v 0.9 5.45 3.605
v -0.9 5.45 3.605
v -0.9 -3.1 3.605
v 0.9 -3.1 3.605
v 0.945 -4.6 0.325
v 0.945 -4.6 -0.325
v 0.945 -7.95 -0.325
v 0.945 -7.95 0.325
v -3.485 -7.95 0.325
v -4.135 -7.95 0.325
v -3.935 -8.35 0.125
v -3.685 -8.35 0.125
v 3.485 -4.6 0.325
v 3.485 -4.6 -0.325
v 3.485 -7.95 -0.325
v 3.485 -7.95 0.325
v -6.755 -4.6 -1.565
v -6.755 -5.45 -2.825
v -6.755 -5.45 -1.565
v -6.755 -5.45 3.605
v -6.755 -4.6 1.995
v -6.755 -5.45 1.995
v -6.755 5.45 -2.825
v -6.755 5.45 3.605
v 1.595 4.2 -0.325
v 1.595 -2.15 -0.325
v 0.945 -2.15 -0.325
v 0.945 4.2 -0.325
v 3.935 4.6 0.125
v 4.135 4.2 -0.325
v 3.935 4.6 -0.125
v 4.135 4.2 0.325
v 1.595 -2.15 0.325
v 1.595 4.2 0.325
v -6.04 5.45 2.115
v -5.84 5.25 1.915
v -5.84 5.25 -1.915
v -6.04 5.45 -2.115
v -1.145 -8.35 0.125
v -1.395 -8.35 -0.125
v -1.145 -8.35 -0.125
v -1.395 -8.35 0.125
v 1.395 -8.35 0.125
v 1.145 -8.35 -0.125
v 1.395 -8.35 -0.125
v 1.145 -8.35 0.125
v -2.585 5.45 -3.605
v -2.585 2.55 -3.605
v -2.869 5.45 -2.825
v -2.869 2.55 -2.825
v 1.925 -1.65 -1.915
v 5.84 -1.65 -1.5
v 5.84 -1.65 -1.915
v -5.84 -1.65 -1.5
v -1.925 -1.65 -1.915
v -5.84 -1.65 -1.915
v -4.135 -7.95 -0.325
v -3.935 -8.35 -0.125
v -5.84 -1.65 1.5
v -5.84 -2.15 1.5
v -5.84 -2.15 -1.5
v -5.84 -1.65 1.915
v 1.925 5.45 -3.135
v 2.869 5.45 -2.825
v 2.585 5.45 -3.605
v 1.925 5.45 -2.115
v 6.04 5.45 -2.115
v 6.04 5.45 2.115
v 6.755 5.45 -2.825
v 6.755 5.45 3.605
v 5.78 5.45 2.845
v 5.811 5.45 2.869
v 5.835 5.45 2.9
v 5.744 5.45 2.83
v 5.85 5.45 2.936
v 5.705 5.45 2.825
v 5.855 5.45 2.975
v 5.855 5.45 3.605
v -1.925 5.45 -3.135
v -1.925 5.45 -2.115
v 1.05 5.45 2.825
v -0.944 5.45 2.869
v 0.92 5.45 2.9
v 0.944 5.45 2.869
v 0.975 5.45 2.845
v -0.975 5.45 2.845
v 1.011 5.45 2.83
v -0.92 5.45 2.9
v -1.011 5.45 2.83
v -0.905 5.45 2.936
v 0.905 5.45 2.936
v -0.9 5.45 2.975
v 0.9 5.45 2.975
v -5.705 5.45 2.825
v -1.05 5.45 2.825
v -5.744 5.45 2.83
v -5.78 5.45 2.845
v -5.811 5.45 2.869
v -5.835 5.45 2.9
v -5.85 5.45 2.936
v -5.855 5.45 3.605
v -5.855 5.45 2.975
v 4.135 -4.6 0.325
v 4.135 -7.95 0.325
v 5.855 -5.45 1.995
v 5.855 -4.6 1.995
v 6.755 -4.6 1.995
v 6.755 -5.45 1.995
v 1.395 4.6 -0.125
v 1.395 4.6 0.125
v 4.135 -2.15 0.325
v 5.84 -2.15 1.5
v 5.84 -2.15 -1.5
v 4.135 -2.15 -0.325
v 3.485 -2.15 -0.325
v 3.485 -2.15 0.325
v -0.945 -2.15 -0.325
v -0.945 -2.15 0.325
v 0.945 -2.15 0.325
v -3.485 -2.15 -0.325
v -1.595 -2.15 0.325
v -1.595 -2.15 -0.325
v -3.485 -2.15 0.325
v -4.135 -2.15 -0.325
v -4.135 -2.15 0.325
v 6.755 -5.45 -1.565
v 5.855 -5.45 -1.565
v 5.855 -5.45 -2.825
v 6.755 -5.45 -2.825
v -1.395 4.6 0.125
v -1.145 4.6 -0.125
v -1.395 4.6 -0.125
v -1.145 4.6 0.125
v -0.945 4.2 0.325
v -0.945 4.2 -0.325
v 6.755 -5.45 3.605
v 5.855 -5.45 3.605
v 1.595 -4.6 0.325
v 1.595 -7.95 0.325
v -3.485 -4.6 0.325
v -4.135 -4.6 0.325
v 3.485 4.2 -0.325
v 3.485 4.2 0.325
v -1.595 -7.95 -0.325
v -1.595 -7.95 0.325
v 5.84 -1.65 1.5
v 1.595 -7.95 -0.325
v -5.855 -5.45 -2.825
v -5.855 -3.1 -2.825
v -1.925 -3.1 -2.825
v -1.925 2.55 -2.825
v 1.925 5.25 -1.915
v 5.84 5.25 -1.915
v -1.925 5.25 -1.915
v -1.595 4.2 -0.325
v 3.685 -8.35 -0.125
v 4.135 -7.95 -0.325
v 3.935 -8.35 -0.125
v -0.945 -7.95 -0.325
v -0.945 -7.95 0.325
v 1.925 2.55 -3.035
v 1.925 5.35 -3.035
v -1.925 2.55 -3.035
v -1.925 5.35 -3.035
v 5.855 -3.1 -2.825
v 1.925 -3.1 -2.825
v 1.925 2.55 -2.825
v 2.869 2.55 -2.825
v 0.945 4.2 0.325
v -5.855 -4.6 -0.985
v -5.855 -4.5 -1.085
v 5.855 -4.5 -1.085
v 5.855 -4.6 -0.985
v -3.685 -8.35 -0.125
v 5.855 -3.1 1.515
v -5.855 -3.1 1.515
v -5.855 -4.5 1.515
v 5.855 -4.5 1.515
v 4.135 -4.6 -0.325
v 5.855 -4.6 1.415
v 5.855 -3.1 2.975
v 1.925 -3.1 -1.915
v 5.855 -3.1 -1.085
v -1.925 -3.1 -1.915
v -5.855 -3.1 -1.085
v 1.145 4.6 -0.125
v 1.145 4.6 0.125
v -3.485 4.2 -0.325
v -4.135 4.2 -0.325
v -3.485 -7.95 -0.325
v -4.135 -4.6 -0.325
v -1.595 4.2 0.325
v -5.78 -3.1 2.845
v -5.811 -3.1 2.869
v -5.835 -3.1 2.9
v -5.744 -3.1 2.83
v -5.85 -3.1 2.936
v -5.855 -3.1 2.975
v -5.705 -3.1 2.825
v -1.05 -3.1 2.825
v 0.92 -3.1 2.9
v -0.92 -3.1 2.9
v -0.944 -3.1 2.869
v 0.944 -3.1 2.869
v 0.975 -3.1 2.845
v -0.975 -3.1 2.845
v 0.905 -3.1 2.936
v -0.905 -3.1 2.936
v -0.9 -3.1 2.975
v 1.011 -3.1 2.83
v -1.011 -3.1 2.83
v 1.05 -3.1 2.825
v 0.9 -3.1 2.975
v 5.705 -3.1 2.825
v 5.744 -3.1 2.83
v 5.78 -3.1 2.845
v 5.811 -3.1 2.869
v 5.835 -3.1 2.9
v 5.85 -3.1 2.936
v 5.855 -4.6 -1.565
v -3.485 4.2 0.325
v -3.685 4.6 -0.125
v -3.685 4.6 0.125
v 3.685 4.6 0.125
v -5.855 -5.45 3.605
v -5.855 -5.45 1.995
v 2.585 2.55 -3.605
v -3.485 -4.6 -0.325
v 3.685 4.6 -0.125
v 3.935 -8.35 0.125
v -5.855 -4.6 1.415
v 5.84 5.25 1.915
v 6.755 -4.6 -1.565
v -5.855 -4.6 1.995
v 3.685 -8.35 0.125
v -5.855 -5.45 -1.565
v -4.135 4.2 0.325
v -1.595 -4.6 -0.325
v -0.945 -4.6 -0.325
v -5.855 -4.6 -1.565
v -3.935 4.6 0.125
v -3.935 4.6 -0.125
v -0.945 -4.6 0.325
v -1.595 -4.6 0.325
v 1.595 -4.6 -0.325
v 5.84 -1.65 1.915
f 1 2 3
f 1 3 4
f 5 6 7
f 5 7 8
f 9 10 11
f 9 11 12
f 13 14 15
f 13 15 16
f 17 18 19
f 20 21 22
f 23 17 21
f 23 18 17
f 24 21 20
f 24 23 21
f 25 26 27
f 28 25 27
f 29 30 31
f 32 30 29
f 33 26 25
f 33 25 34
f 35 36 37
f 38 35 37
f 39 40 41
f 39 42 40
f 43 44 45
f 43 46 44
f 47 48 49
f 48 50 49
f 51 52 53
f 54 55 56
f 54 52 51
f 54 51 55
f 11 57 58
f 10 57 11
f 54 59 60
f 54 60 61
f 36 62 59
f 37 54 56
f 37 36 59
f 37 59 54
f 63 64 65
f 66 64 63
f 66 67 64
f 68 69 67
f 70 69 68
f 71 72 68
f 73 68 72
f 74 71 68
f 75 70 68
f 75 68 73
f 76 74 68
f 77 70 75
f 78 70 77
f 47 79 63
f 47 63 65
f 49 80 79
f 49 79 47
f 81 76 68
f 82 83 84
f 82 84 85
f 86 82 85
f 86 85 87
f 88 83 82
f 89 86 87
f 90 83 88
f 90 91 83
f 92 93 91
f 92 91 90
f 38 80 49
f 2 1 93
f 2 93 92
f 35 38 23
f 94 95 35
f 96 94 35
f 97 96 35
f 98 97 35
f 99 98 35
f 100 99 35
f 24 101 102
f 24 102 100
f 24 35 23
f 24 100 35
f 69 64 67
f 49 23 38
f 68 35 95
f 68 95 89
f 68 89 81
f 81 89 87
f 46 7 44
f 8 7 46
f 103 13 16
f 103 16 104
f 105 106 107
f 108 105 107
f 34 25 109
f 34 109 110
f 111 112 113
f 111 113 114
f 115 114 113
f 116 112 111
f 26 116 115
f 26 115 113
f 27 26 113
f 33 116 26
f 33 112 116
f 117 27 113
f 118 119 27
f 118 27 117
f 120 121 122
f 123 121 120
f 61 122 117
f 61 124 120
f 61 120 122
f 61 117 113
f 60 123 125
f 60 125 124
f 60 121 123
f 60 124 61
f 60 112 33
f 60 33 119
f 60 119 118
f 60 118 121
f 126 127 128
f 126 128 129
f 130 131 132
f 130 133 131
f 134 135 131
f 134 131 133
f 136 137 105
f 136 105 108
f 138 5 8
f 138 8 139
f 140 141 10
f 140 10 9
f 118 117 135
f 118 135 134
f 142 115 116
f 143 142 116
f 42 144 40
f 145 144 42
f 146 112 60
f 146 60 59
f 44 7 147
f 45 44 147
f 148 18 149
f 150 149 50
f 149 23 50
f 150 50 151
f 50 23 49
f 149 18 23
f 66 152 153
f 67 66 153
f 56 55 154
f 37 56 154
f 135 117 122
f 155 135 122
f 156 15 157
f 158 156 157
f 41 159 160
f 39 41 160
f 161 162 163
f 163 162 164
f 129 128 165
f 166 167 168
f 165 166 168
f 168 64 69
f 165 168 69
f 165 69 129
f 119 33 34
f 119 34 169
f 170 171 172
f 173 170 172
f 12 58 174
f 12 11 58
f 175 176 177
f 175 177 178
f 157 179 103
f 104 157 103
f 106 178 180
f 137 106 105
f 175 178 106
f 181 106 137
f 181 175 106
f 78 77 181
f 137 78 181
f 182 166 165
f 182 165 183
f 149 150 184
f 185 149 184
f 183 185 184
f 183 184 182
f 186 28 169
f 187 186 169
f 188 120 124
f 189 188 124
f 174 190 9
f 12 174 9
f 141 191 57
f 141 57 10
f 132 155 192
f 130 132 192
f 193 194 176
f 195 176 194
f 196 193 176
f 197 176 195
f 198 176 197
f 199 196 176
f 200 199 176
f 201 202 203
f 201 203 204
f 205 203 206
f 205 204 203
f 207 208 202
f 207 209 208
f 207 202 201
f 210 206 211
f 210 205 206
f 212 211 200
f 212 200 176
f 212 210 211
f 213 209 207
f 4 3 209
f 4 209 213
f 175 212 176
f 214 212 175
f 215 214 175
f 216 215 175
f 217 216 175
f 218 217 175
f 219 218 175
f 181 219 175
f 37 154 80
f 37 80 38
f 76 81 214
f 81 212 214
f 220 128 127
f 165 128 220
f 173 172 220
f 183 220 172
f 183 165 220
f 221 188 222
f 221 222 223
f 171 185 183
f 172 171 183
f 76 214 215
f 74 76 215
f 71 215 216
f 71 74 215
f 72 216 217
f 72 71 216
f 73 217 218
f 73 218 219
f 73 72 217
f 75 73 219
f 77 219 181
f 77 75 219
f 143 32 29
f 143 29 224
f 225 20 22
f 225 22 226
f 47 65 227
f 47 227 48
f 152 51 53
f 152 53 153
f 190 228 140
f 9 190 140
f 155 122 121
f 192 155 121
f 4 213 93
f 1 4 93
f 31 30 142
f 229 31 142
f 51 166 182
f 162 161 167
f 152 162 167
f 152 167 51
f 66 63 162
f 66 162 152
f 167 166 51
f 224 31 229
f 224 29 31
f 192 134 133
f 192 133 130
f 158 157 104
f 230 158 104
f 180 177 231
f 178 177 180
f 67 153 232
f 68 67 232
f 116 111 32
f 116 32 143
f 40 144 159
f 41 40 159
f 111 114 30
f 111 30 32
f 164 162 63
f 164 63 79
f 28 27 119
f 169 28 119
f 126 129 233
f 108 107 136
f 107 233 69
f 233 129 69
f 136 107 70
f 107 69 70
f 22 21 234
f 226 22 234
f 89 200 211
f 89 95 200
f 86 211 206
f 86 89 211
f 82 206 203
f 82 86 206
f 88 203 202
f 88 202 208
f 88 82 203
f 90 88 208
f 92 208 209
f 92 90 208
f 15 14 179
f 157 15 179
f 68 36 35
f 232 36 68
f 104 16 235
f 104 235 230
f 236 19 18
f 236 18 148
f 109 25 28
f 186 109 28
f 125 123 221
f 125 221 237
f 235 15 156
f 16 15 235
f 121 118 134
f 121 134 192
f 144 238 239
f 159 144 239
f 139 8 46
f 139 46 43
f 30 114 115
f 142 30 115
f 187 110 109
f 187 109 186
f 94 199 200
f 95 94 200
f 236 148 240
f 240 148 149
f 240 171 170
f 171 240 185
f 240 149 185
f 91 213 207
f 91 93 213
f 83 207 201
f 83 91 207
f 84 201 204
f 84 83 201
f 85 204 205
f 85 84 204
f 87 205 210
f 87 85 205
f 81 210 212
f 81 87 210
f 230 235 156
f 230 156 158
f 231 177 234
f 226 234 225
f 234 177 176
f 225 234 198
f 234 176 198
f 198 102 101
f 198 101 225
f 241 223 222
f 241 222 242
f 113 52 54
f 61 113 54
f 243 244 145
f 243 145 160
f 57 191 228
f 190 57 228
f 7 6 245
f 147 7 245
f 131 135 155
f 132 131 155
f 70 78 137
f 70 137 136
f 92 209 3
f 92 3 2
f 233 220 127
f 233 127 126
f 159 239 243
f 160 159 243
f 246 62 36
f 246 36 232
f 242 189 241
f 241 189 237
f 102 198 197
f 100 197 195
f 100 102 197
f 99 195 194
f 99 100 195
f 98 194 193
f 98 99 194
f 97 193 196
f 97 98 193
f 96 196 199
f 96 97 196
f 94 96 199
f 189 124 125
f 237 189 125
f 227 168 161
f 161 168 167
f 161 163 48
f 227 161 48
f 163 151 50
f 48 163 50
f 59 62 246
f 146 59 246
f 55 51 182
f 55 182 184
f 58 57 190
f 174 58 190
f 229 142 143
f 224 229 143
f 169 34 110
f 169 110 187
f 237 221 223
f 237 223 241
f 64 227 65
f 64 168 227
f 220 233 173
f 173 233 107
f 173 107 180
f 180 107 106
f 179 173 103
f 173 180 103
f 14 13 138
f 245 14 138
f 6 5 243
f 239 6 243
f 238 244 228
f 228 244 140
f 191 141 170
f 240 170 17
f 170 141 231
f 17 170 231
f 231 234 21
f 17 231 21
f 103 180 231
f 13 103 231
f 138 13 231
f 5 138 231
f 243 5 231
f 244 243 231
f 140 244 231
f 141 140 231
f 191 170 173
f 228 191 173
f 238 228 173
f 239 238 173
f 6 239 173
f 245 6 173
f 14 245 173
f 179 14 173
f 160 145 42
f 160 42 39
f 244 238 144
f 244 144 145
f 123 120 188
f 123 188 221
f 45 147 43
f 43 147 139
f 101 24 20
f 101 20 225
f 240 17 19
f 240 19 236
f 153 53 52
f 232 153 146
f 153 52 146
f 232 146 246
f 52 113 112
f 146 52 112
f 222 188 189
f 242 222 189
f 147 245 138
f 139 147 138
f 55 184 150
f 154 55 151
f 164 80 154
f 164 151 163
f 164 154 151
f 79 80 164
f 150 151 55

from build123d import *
from OCP.BRepFilletAPI import BRepFilletAPI_MakeChamfer

# Parameters (mm, degrees)
CUT_EXTRUDE1_START       = -8.68
CUT_EXTRUDE1_OUTLINE_W   = 6.64
CUT_EXTRUDE1_OUTLINE_H   = 7.1
CUT_EXTRUDE1_DEPTH       = 4.83
CUT_EXTRUDE1_2_OUTLINE_W = 6.64
CUT_EXTRUDE1_2_OUTLINE_H = 7.1
CUT_EXTRUDE1_2_DEPTH     = 4.83
CUT_EXTRUDE1_START_2     = -3.85
CUT_EXTRUDE1_3_OUTLINE_W = 2.105
CUT_EXTRUDE1_3_OUTLINE_H = 7.1
CUT_EXTRUDE1_3_DEPTH     = 3.85
BOSS_EXTRUDE1_DEPTH      = 2.95
SKETCH3_W                = 3.415
SKETCH3_H                = 7.1
CUT_EXTRUDE2_DEPTH       = 3.915
SKETCH4_W                = 3.415
SKETCH4_H                = 7.1
CUT_EXTRUDE3_DEPTH       = 3.915
SKETCH5_W                = 0.21
SKETCH5_H                = 10.05
CUT_EXTRUDE4_DEPTH       = 4.1696
SKETCH6_W                = 4.83
SKETCH6_H                = 0.21
SKETCH6_W_2              = 0.6604
CUT_EXTRUDE5_DEPTH       = 7.15
SKETCH7_W                = 0.21
SKETCH7_H                = 2.9
CUT_EXTRUDE6_DEPTH       = 4.1696
SKETCH8_W                = 5.1708
SKETCH8_H                = 2.9
BOSS_EXTRUDE2_DEPTH      = 0.57
SKETCH9_W                = 11.71
SKETCH9_H                = 0.78
CUT_EXTRUDE7_DEPTH       = 13.634419259
SKETCH10_W               = 1.8
SKETCH10_H               = 8.55
BOSS_EXTRUDE3_DEPTH      = 0.78
SKETCH11_W               = 11.71
SKETCH11_H               = 1.5
CUT_EXTRUDE8_DEPTH       = 1.31
SKETCH12_W               = 0.9
SKETCH12_H               = 1.61
BOSS_EXTRUDE4_DEPTH      = 0.85
SKETCH13_W               = 0.9
SKETCH13_H               = 1.61
BOSS_EXTRUDE5_DEPTH      = 0.85
CUT_EXTRUDE9_REACH       = 11.866
SKETCH15_W               = 3.85
SKETCH15_H               = 1.5
SKETCH16_W               = 1.74
SKETCH16_H               = 1.5
CUT_EXTRUDE10_DEPTH      = 3.93
SKETCH17_W               = 0.9
SKETCH17_H               = 1.26
BOSS_EXTRUDE6_DEPTH      = 0.85
SKETCH18_W               = 1.74
SKETCH18_H               = 1.5
CUT_EXTRUDE11_DEPTH      = 3.93
SKETCH19_W               = 0.9
SKETCH19_H               = 1.26
BOSS_EXTRUDE7_DEPTH      = 0.85
SKETCH20_W               = 11.68
SKETCH20_H               = 3
CUT_EXTRUDE12_DEPTH      = 0.5
CUT_EXTRUDE13_REACH      = 12.442
SKETCH22_W               = 11.68
SKETCH22_H               = 0.415
SKETCH23_W               = 0.65
SKETCH23_H               = 0.65
BOSS_EXTRUDE8_DEPTH      = 6.75
SKETCH24_W               = 0.65
SKETCH24_H               = 0.65
BOSS_EXTRUDE9_DEPTH      = 6.75
SKETCH25_W               = 0.65
SKETCH25_H               = 0.65
BOSS_EXTRUDE10_DEPTH     = 6.75
SKETCH26_W               = 0.65
SKETCH26_H               = 0.65
BOSS_EXTRUDE11_DEPTH     = 6.75
SKETCH27_W               = 0.65
SKETCH27_H               = 0.65
BOSS_EXTRUDE12_DEPTH     = 3.75
SKETCH28_W               = 0.65
SKETCH28_H               = 0.65
BOSS_EXTRUDE13_DEPTH     = 3.75
SKETCH29_W               = 0.65
SKETCH29_H               = 0.65
BOSS_EXTRUDE14_DEPTH     = 3.75
SKETCH30_W               = 0.65
SKETCH30_H               = 0.65
BOSS_EXTRUDE15_DEPTH     = 3.75
DRAFT1_ANGLE             = 20
CHAMFER1_SIZE            = 0.1
CHAMFER2_SIZE            = 0.2
CHAMFER2_SIZE2           = 0.4
CHAMFER3_SIZE            = 0.2
FILLET1_R                = 0.15


with BuildPart() as part:
    # Cut-Extrude1: read off the stored shape, not the designer's step
    # Cut-Extrude1 outline → Cut-Extrude1 (new body)
    with BuildSketch(Plane(origin=(1.925, 0, 0), x_dir=(0, 0, -1), z_dir=(1, 0, 0)).offset(CUT_EXTRUDE1_START)):
        with Locations((-0.285, 1.9)):
            Rectangle(CUT_EXTRUDE1_OUTLINE_W, CUT_EXTRUDE1_OUTLINE_H)
    extrude(amount=CUT_EXTRUDE1_DEPTH)



with BuildPart() as body_2:
    # Cut-Extrude1 2 outline → Cut-Extrude1 2 (new body)
    with BuildSketch(Plane(origin=(1.925, 0, 0), x_dir=(0, 0, -1), z_dir=(1, 0, 0))):
        with Locations((-0.285, 1.9)):
            Rectangle(CUT_EXTRUDE1_2_OUTLINE_W, CUT_EXTRUDE1_2_OUTLINE_H)
    extrude(amount=CUT_EXTRUDE1_2_DEPTH)


with BuildPart() as part_1:
    add(part.part)

    add(body_2.part)  # Cut-Extrude1 3 merges body 2
    # Cut-Extrude1 3 outline → Cut-Extrude1 3 (add)
    with BuildSketch(Plane(origin=(1.925, 0, 0), x_dir=(0, 0, -1), z_dir=(1, 0, 0)).offset(CUT_EXTRUDE1_START_2)):
        with Locations((-2.5525, 1.9)):
            Rectangle(CUT_EXTRUDE1_3_OUTLINE_W, CUT_EXTRUDE1_3_OUTLINE_H)
    extrude(amount=CUT_EXTRUDE1_3_DEPTH)

    # Sketch2 → Boss-Extrude1 (add)
    with BuildSketch(Plane.XZ.offset(1.65)):
        Polygon((6.755, -3.035), (1.925, -3.035), (1.925, -1.915), (-1.925, -1.915), (-1.925, -3.035), (-6.755, -3.035), (-6.755, 3.605), (6.755, 3.605), align=None)
    extrude(amount=BOSS_EXTRUDE1_DEPTH)

    # Sketch3 → Cut-Extrude2 (cut)
    with BuildSketch(Plane.ZY.offset(-1.925)):
        with Locations((-0.2075, 1.9)):
            Rectangle(SKETCH3_W, SKETCH3_H)
    extrude(amount=-CUT_EXTRUDE2_DEPTH, mode=Mode.SUBTRACT)

    # Sketch4 → Cut-Extrude3 (cut)
    with BuildSketch(Plane(origin=(-1.925, 0, 0), x_dir=(0, 0, -1), z_dir=(1, 0, 0))):
        with Locations((0.2075, 1.9)):
            Rectangle(SKETCH4_W, SKETCH4_H)
    extrude(amount=-CUT_EXTRUDE3_DEPTH, mode=Mode.SUBTRACT)

    # Sketch5 → Cut-Extrude4 (cut)
    with BuildSketch(Plane(origin=(6.755, 0, 0), x_dir=(0, 0, -1), z_dir=(1, 0, 0))):
        with Locations((2.93, 0.425)):
            Rectangle(SKETCH5_W, SKETCH5_H)
    extrude(amount=-CUT_EXTRUDE4_DEPTH, mode=Mode.SUBTRACT)

    # Sketch6 → Cut-Extrude5 (cut)
    with BuildSketch(Plane.XZ.offset(4.6)):
        with Locations((-4.34, -2.93)):
            Rectangle(SKETCH6_W, SKETCH6_H)
        with Locations((2.2552, -2.93)):
            Rectangle(SKETCH6_W_2, SKETCH6_H)
    extrude(amount=-CUT_EXTRUDE5_DEPTH, mode=Mode.SUBTRACT)

    # Sketch7 → Cut-Extrude6 (cut)
    with BuildSketch(Plane.ZY.offset(6.755)):
        with Locations((-2.93, 4)):
            Rectangle(SKETCH7_W, SKETCH7_H)
    extrude(amount=-CUT_EXTRUDE6_DEPTH, mode=Mode.SUBTRACT)

    # Sketch8 → Boss-Extrude2 (add)
    with BuildSketch(Plane(origin=(0, 0, -3.035), x_dir=(-1, 0, 0), z_dir=(0, 0, -1))):
        with Locations((0, 4)):
            Rectangle(SKETCH8_W, SKETCH8_H)
    extrude(amount=BOSS_EXTRUDE2_DEPTH)

    # Sketch9 → Cut-Extrude7 (cut, through all)
    with BuildSketch(Plane.XZ.offset(4.6)):
        with Locations((0, 3.215)):
            Rectangle(SKETCH9_W, SKETCH9_H)
    extrude(amount=-CUT_EXTRUDE7_DEPTH, mode=Mode.SUBTRACT)

    # Sketch10 → Boss-Extrude3 (add)
    with BuildSketch(Plane.XY.offset(2.825)):
        with Locations((0, 1.175)):
            Rectangle(SKETCH10_W, SKETCH10_H)
    extrude(amount=BOSS_EXTRUDE3_DEPTH)

    # Sketch11 → Cut-Extrude8 (cut)
    with BuildSketch(Plane.XY.offset(2.825)):
        with Locations((0, -3.85)):
            Rectangle(SKETCH11_W, SKETCH11_H)
    extrude(amount=-CUT_EXTRUDE8_DEPTH, mode=Mode.SUBTRACT)

    # Sketch12 → Boss-Extrude4 (add)
    with BuildSketch(Plane.XZ.offset(4.6)):
        with Locations((6.305, 2.8)):
            Rectangle(SKETCH12_W, SKETCH12_H)
    extrude(amount=BOSS_EXTRUDE4_DEPTH)

    # Sketch13 → Boss-Extrude5 (add)
    with BuildSketch(Plane.XZ.offset(4.6)):
        with Locations((-6.305, 2.8)):
            Rectangle(SKETCH13_W, SKETCH13_H)
    extrude(amount=BOSS_EXTRUDE5_DEPTH)

    # Sketch15 → Cut-Extrude9 (cut, up to next)
    with BuildSketch(Plane.XY.offset(-1.085), mode=Mode.PRIVATE) as cut_extrude9_sk1:
        with Locations((0, -3.85)):
            Rectangle(SKETCH15_W, SKETCH15_H)
    cut_extrude9_tool1 = extrude(cut_extrude9_sk1.sketch, amount=-CUT_EXTRUDE9_REACH, mode=Mode.PRIVATE) & part_1.part
    add(cut_extrude9_tool1.solids().sort_by_distance((0, -3.85, -1.085))[0], mode=Mode.SUBTRACT)

    # Sketch16 → Cut-Extrude10 (cut)
    with BuildSketch(Plane.ZY.offset(-1.925)):
        with Locations((-1.955, -3.85)):
            Rectangle(SKETCH16_W, SKETCH16_H)
    extrude(amount=-CUT_EXTRUDE10_DEPTH, mode=Mode.SUBTRACT)

    # Sketch17 → Boss-Extrude6 (add)
    with BuildSketch(Plane.XZ.offset(4.6)):
        with Locations((6.305, -2.195)):
            Rectangle(SKETCH17_W, SKETCH17_H)
    extrude(amount=BOSS_EXTRUDE6_DEPTH)

    # Sketch18 → Cut-Extrude11 (cut)
    with BuildSketch(Plane(origin=(-1.925, 0, 0), x_dir=(0, 0, -1), z_dir=(1, 0, 0))):
        with Locations((1.955, -3.85)):
            Rectangle(SKETCH18_W, SKETCH18_H)
    extrude(amount=-CUT_EXTRUDE11_DEPTH, mode=Mode.SUBTRACT)

    # Sketch19 → Boss-Extrude7 (add)
    with BuildSketch(Plane.XZ.offset(4.6)):
        with Locations((-6.305, -2.195)):
            Rectangle(SKETCH19_W, SKETCH19_H)
    extrude(amount=BOSS_EXTRUDE7_DEPTH)

    # Sketch20 → Cut-Extrude12 (cut)
    with BuildSketch(Plane(origin=(0, -1.65, 0), x_dir=(-1, 0, 0), z_dir=(0, 1, 0))):
        Rectangle(SKETCH20_W, SKETCH20_H)
    extrude(amount=-CUT_EXTRUDE12_DEPTH, mode=Mode.SUBTRACT)

    # Sketch22 → Cut-Extrude13 (cut, up to next)
    with BuildSketch(Plane.XZ.offset(1.65), mode=Mode.PRIVATE) as cut_extrude13_sk1:
        with Locations((0, 1.7075)):
            Rectangle(SKETCH22_W, SKETCH22_H)
    cut_extrude13_tool1 = extrude(cut_extrude13_sk1.sketch, amount=-CUT_EXTRUDE13_REACH, mode=Mode.PRIVATE) & part_1.part
    add(cut_extrude13_tool1.solids().sort_by_distance((0, -1.65, 1.7075))[0], mode=Mode.SUBTRACT)

    # Sketch23 → Boss-Extrude8 (add)
    with BuildSketch(Plane(origin=(0, -2.15, 0), x_dir=(-1, 0, 0), z_dir=(0, 1, 0))):
        with Locations((3.81, 0)):
            Rectangle(SKETCH23_W, SKETCH23_H)
    extrude(amount=BOSS_EXTRUDE8_DEPTH)

    # Sketch24 → Boss-Extrude9 (add)
    with BuildSketch(Plane(origin=(0, -2.15, 0), x_dir=(-1, 0, 0), z_dir=(0, 1, 0))):
        with Locations((1.27, 0)):
            Rectangle(SKETCH24_W, SKETCH24_H)
    extrude(amount=BOSS_EXTRUDE9_DEPTH)

    # Sketch25 → Boss-Extrude10 (add)
    with BuildSketch(Plane(origin=(0, -2.15, 0), x_dir=(-1, 0, 0), z_dir=(0, 1, 0))):
        with Locations((-1.27, 0)):
            Rectangle(SKETCH25_W, SKETCH25_H)
    extrude(amount=BOSS_EXTRUDE10_DEPTH)

    # Sketch26 → Boss-Extrude11 (add)
    with BuildSketch(Plane(origin=(0, -2.15, 0), x_dir=(-1, 0, 0), z_dir=(0, 1, 0))):
        with Locations((-3.81, 0)):
            Rectangle(SKETCH26_W, SKETCH26_H)
    extrude(amount=BOSS_EXTRUDE11_DEPTH)

    # Sketch27 → Boss-Extrude12 (add)
    with BuildSketch(Plane.XZ.offset(4.6)):
        with Locations((-3.81, 0)):
            Rectangle(SKETCH27_W, SKETCH27_H)
    extrude(amount=BOSS_EXTRUDE12_DEPTH)

    # Sketch28 → Boss-Extrude13 (add)
    with BuildSketch(Plane.XZ.offset(4.6)):
        with Locations((-1.27, 0)):
            Rectangle(SKETCH28_W, SKETCH28_H)
    extrude(amount=BOSS_EXTRUDE13_DEPTH)

    # Sketch29 → Boss-Extrude14 (add)
    with BuildSketch(Plane.XZ.offset(4.6)):
        with Locations((1.27, 0)):
            Rectangle(SKETCH29_W, SKETCH29_H)
    extrude(amount=BOSS_EXTRUDE14_DEPTH)

    # Sketch30 → Boss-Extrude15 (add)
    with BuildSketch(Plane.XZ.offset(4.6)):
        with Locations((3.81, 0)):
            Rectangle(SKETCH30_W, SKETCH30_H)
    extrude(amount=BOSS_EXTRUDE15_DEPTH)

    # Draft1
    draft1_faces = [part_1.faces().sort_by_distance(p)[0] for p in [
        (-2.5854, 4, -3.215),
        (2.5854, 4, -3.215),
    ]]
    draft(draft1_faces, Plane(origin=(0, 0, -3.605), x_dir=(-1, 0, 0), z_dir=(0, 0, -1)), DRAFT1_ANGLE)

    # Chamfer1
    chamfer1_edges = [part_1.edges().sort_by_distance(p)[0] for p in [
        (0, 5.45, -3.035),
        (0, -4.6, 1.515),
        (0, -4.6, -1.085),
    ]]
    chamfer(chamfer1_edges, length=CHAMFER1_SIZE)

    # Chamfer2: one chamfer whose edges measure the first distance from different faces: ONE call of the kernel's chamfer builder (chamfer() names one face for all edges)
    chamfer2_edges_1 = [part_1.edges().sort_by_distance(p)[0] for p in [
        (-4.135, 4.6, 0),
        (-3.81, 4.6, 0.325),
        (-3.485, 4.6, 0),
        (-3.81, 4.6, -0.325),
    ]]
    chamfer2_side_1 = [part_1.faces().sort_by_distance(p)[0] for p in [
        (-3.81, 4.6, 0),
    ]]
    chamfer2_edges_2 = [part_1.edges().sort_by_distance(p)[0] for p in [
        (-1.27, 4.6, -0.325),
        (-1.595, 4.6, 0),
        (-1.27, 4.6, 0.325),
        (-0.945, 4.6, 0),
    ]]
    chamfer2_side_2 = [part_1.faces().sort_by_distance(p)[0] for p in [
        (-1.27, 4.6, 0),
    ]]
    chamfer2_edges_3 = [part_1.edges().sort_by_distance(p)[0] for p in [
        (0.945, 4.6, 0),
        (1.27, 4.6, 0.325),
        (1.595, 4.6, 0),
        (1.27, 4.6, -0.325),
    ]]
    chamfer2_side_3 = [part_1.faces().sort_by_distance(p)[0] for p in [
        (1.27, 4.6, 0),
    ]]
    chamfer2_edges_4 = [part_1.edges().sort_by_distance(p)[0] for p in [
        (3.81, 4.6, -0.325),
        (3.485, 4.6, 0),
        (3.81, 4.6, 0.325),
        (4.135, 4.6, 0),
    ]]
    chamfer2_side_4 = [part_1.faces().sort_by_distance(p)[0] for p in [
        (3.81, 4.6, 0),
    ]]
    chamfer2_edges_5 = [part_1.edges().sort_by_distance(p)[0] for p in [
        (-3.81, -8.35, -0.325),
        (-3.485, -8.35, 0),
        (-3.81, -8.35, 0.325),
        (-4.135, -8.35, 0),
    ]]
    chamfer2_side_5 = [part_1.faces().sort_by_distance(p)[0] for p in [
        (-3.81, -8.35, 0),
    ]]
    chamfer2_edges_6 = [part_1.edges().sort_by_distance(p)[0] for p in [
        (-1.27, -8.35, -0.325),
        (-0.945, -8.35, 0),
        (-1.27, -8.35, 0.325),
        (-1.595, -8.35, 0),
    ]]
    chamfer2_side_6 = [part_1.faces().sort_by_distance(p)[0] for p in [
        (-1.27, -8.35, 0),
    ]]
    chamfer2_edges_7 = [part_1.edges().sort_by_distance(p)[0] for p in [
        (1.27, -8.35, -0.325),
        (1.595, -8.35, 0),
        (1.27, -8.35, 0.325),
        (0.945, -8.35, 0),
    ]]
    chamfer2_side_7 = [part_1.faces().sort_by_distance(p)[0] for p in [
        (1.27, -8.35, 0),
    ]]
    chamfer2_edges_8 = [part_1.edges().sort_by_distance(p)[0] for p in [
        (4.135, -8.35, 0),
        (3.81, -8.35, 0.325),
        (3.485, -8.35, 0),
        (3.81, -8.35, -0.325),
    ]]
    chamfer2_side_8 = [part_1.faces().sort_by_distance(p)[0] for p in [
        (3.81, -8.35, 0),
    ]]
    chamfer2 = BRepFilletAPI_MakeChamfer(part_1.part.solid().wrapped)
    for e in chamfer2_edges_1:
        chamfer2.Add(CHAMFER2_SIZE, CHAMFER2_SIZE2, e.wrapped, chamfer2_side_1[0].wrapped)  # the first distance lies on this face
    for e in chamfer2_edges_2:
        chamfer2.Add(CHAMFER2_SIZE, CHAMFER2_SIZE2, e.wrapped, chamfer2_side_2[0].wrapped)  # the first distance lies on this face
    for e in chamfer2_edges_3:
        chamfer2.Add(CHAMFER2_SIZE, CHAMFER2_SIZE2, e.wrapped, chamfer2_side_3[0].wrapped)  # the first distance lies on this face
    for e in chamfer2_edges_4:
        chamfer2.Add(CHAMFER2_SIZE, CHAMFER2_SIZE2, e.wrapped, chamfer2_side_4[0].wrapped)  # the first distance lies on this face
    for e in chamfer2_edges_5:
        chamfer2.Add(CHAMFER2_SIZE, CHAMFER2_SIZE2, e.wrapped, chamfer2_side_5[0].wrapped)  # the first distance lies on this face
    for e in chamfer2_edges_6:
        chamfer2.Add(CHAMFER2_SIZE, CHAMFER2_SIZE2, e.wrapped, chamfer2_side_6[0].wrapped)  # the first distance lies on this face
    for e in chamfer2_edges_7:
        chamfer2.Add(CHAMFER2_SIZE, CHAMFER2_SIZE2, e.wrapped, chamfer2_side_7[0].wrapped)  # the first distance lies on this face
    for e in chamfer2_edges_8:
        chamfer2.Add(CHAMFER2_SIZE, CHAMFER2_SIZE2, e.wrapped, chamfer2_side_8[0].wrapped)  # the first distance lies on this face
    add(Compound.cast(chamfer2.Shape()), mode=Mode.REPLACE)

    # Chamfer3
    chamfer3_edges = [part_1.edges().sort_by_distance(p)[0] for p in [
        (5.84, 5.45, 0),
        (3.8825, 5.45, -1.915),
        (-5.84, 5.45, 0),
        (-3.8825, 5.45, -1.915),
        (0, 5.45, 1.915),
    ]]
    chamfer(chamfer3_edges, length=CHAMFER3_SIZE)

    # Fillet1
    fillet1_edges = [part_1.edges().sort_by_distance(p)[0] for p in [
        (5.855, 1.175, 2.825),
        (-5.855, 1.175, 2.825),
        (-0.9, 1.175, 2.825),
        (0.9, 1.175, 2.825),
    ]]
    fillet(fillet1_edges, radius=FILLET1_R)


solid = part_1.part
